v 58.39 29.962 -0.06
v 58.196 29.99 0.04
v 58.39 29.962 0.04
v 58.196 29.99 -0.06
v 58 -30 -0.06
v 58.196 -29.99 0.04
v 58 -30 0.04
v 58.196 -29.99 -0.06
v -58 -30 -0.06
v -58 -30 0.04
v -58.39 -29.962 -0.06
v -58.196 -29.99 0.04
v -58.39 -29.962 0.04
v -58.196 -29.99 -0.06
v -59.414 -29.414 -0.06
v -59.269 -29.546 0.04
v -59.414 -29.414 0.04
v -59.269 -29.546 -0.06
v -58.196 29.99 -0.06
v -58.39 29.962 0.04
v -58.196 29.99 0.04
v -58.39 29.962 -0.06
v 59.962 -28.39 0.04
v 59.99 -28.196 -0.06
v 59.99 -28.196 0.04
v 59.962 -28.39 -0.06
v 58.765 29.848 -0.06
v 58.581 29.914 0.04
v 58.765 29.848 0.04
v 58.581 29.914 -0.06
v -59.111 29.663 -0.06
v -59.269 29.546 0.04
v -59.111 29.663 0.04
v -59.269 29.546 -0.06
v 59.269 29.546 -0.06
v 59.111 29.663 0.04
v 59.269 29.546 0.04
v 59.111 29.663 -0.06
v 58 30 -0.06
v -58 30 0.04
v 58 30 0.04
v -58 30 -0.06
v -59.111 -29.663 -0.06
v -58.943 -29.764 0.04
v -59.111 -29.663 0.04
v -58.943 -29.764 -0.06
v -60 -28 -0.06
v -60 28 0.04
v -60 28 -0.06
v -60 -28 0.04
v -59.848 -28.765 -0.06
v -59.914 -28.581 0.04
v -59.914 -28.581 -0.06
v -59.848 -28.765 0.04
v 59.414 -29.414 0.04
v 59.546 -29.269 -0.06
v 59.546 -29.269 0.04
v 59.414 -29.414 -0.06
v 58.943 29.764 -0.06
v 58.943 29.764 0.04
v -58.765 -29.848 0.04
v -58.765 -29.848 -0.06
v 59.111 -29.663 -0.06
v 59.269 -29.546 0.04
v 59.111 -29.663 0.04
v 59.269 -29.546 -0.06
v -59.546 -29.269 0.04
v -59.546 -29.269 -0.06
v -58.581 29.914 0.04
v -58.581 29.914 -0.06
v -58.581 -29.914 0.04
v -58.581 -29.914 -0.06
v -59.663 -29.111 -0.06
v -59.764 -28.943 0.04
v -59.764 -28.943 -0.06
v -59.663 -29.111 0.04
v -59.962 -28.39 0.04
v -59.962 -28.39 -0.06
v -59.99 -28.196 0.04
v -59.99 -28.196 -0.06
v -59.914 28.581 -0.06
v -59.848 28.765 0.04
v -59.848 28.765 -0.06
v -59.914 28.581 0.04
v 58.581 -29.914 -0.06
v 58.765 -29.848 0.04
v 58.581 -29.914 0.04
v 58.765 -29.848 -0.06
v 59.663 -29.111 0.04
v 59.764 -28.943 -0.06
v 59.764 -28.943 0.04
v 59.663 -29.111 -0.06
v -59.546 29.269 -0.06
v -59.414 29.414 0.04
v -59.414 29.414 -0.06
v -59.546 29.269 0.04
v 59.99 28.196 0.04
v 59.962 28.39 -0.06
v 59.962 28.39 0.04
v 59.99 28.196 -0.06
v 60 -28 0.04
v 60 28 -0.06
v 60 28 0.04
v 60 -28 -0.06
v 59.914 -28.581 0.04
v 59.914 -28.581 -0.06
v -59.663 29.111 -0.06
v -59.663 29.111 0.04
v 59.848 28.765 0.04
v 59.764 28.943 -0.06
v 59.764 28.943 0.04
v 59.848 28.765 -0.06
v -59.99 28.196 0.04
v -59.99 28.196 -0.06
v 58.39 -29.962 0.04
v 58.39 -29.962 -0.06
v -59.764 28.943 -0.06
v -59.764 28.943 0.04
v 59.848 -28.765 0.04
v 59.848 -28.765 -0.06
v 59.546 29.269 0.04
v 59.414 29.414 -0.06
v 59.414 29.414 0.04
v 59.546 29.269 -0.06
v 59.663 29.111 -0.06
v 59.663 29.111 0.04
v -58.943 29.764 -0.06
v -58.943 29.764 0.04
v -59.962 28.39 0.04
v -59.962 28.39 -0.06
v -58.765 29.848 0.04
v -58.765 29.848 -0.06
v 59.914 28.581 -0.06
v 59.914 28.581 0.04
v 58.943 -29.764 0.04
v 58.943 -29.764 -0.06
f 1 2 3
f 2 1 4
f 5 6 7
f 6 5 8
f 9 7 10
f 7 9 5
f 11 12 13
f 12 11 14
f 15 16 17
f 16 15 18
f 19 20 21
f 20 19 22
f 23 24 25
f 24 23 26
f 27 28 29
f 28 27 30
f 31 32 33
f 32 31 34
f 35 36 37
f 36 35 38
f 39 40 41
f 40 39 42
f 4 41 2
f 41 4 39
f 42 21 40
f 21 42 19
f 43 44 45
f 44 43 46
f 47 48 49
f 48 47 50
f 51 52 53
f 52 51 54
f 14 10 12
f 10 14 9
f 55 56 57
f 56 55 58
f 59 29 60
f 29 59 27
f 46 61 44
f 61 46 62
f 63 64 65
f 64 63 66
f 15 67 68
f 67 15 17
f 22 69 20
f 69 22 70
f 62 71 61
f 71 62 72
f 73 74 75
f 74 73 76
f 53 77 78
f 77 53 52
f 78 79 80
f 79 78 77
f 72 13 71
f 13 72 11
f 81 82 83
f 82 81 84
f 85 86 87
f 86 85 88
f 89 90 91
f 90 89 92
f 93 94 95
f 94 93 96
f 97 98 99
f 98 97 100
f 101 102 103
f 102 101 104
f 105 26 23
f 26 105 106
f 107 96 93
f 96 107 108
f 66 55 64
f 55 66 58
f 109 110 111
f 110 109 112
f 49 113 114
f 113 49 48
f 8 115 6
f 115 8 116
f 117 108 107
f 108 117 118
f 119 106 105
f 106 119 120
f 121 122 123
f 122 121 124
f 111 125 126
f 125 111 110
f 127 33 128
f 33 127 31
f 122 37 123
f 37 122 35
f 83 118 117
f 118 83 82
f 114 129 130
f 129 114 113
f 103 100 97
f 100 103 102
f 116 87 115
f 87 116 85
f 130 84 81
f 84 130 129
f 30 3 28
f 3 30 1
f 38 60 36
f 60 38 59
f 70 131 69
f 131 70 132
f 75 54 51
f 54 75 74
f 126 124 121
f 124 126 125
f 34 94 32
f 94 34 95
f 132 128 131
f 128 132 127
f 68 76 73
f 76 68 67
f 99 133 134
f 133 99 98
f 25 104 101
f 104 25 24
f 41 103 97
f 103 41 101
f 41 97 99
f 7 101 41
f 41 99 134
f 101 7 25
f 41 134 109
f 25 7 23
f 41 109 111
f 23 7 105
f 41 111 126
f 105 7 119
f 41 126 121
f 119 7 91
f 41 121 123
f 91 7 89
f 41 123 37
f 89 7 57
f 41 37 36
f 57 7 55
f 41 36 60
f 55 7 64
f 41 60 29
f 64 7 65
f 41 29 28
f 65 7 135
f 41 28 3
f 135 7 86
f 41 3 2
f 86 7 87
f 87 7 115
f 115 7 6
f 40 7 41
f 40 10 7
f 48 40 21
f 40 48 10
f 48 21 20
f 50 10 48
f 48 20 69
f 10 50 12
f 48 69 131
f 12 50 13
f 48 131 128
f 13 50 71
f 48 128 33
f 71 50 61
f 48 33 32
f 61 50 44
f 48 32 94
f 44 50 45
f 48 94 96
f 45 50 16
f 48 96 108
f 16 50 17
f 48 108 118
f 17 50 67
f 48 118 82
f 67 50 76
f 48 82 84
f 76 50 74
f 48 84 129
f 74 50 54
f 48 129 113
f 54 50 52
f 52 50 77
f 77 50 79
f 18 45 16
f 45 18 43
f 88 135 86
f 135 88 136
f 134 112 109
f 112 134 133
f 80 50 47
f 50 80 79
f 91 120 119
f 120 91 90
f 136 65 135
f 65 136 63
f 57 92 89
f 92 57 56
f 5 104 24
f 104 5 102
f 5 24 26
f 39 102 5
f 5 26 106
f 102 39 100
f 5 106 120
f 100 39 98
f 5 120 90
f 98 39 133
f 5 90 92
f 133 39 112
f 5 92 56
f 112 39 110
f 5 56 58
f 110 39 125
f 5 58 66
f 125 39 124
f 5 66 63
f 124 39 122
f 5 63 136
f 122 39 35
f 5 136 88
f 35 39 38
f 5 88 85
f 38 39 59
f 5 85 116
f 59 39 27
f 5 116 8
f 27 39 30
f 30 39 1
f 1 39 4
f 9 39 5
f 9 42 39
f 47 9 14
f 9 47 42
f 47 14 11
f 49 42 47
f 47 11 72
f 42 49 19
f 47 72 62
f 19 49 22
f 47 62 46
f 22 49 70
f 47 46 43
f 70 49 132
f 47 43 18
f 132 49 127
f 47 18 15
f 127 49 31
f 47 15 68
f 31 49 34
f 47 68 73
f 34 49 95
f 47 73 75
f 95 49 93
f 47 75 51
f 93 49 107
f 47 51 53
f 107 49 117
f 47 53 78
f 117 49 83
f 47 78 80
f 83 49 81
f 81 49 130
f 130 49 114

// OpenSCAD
$fn=64;

module foil_tape_sheet(length=120, width=60, thickness=0.08, corner_r=2, adhesive_thickness=0.02) {
    union() {
        // Aluminum foil layer
        color([0.75,0.75,0.78])
        linear_extrude(height=thickness, center=true)
            offset(r=corner_r)
                square([length-2*corner_r, width-2*corner_r], center=true);

        // Adhesive layer (slightly darker)
        translate([0,0,-(thickness+adhesive_thickness)/2])
        color([0.55,0.55,0.58])
        linear_extrude(height=adhesive_thickness, center=true)
            offset(r=corner_r)
                square([length-2*corner_r, width-2*corner_r], center=true);
    }
}

foil_tape_sheet();
